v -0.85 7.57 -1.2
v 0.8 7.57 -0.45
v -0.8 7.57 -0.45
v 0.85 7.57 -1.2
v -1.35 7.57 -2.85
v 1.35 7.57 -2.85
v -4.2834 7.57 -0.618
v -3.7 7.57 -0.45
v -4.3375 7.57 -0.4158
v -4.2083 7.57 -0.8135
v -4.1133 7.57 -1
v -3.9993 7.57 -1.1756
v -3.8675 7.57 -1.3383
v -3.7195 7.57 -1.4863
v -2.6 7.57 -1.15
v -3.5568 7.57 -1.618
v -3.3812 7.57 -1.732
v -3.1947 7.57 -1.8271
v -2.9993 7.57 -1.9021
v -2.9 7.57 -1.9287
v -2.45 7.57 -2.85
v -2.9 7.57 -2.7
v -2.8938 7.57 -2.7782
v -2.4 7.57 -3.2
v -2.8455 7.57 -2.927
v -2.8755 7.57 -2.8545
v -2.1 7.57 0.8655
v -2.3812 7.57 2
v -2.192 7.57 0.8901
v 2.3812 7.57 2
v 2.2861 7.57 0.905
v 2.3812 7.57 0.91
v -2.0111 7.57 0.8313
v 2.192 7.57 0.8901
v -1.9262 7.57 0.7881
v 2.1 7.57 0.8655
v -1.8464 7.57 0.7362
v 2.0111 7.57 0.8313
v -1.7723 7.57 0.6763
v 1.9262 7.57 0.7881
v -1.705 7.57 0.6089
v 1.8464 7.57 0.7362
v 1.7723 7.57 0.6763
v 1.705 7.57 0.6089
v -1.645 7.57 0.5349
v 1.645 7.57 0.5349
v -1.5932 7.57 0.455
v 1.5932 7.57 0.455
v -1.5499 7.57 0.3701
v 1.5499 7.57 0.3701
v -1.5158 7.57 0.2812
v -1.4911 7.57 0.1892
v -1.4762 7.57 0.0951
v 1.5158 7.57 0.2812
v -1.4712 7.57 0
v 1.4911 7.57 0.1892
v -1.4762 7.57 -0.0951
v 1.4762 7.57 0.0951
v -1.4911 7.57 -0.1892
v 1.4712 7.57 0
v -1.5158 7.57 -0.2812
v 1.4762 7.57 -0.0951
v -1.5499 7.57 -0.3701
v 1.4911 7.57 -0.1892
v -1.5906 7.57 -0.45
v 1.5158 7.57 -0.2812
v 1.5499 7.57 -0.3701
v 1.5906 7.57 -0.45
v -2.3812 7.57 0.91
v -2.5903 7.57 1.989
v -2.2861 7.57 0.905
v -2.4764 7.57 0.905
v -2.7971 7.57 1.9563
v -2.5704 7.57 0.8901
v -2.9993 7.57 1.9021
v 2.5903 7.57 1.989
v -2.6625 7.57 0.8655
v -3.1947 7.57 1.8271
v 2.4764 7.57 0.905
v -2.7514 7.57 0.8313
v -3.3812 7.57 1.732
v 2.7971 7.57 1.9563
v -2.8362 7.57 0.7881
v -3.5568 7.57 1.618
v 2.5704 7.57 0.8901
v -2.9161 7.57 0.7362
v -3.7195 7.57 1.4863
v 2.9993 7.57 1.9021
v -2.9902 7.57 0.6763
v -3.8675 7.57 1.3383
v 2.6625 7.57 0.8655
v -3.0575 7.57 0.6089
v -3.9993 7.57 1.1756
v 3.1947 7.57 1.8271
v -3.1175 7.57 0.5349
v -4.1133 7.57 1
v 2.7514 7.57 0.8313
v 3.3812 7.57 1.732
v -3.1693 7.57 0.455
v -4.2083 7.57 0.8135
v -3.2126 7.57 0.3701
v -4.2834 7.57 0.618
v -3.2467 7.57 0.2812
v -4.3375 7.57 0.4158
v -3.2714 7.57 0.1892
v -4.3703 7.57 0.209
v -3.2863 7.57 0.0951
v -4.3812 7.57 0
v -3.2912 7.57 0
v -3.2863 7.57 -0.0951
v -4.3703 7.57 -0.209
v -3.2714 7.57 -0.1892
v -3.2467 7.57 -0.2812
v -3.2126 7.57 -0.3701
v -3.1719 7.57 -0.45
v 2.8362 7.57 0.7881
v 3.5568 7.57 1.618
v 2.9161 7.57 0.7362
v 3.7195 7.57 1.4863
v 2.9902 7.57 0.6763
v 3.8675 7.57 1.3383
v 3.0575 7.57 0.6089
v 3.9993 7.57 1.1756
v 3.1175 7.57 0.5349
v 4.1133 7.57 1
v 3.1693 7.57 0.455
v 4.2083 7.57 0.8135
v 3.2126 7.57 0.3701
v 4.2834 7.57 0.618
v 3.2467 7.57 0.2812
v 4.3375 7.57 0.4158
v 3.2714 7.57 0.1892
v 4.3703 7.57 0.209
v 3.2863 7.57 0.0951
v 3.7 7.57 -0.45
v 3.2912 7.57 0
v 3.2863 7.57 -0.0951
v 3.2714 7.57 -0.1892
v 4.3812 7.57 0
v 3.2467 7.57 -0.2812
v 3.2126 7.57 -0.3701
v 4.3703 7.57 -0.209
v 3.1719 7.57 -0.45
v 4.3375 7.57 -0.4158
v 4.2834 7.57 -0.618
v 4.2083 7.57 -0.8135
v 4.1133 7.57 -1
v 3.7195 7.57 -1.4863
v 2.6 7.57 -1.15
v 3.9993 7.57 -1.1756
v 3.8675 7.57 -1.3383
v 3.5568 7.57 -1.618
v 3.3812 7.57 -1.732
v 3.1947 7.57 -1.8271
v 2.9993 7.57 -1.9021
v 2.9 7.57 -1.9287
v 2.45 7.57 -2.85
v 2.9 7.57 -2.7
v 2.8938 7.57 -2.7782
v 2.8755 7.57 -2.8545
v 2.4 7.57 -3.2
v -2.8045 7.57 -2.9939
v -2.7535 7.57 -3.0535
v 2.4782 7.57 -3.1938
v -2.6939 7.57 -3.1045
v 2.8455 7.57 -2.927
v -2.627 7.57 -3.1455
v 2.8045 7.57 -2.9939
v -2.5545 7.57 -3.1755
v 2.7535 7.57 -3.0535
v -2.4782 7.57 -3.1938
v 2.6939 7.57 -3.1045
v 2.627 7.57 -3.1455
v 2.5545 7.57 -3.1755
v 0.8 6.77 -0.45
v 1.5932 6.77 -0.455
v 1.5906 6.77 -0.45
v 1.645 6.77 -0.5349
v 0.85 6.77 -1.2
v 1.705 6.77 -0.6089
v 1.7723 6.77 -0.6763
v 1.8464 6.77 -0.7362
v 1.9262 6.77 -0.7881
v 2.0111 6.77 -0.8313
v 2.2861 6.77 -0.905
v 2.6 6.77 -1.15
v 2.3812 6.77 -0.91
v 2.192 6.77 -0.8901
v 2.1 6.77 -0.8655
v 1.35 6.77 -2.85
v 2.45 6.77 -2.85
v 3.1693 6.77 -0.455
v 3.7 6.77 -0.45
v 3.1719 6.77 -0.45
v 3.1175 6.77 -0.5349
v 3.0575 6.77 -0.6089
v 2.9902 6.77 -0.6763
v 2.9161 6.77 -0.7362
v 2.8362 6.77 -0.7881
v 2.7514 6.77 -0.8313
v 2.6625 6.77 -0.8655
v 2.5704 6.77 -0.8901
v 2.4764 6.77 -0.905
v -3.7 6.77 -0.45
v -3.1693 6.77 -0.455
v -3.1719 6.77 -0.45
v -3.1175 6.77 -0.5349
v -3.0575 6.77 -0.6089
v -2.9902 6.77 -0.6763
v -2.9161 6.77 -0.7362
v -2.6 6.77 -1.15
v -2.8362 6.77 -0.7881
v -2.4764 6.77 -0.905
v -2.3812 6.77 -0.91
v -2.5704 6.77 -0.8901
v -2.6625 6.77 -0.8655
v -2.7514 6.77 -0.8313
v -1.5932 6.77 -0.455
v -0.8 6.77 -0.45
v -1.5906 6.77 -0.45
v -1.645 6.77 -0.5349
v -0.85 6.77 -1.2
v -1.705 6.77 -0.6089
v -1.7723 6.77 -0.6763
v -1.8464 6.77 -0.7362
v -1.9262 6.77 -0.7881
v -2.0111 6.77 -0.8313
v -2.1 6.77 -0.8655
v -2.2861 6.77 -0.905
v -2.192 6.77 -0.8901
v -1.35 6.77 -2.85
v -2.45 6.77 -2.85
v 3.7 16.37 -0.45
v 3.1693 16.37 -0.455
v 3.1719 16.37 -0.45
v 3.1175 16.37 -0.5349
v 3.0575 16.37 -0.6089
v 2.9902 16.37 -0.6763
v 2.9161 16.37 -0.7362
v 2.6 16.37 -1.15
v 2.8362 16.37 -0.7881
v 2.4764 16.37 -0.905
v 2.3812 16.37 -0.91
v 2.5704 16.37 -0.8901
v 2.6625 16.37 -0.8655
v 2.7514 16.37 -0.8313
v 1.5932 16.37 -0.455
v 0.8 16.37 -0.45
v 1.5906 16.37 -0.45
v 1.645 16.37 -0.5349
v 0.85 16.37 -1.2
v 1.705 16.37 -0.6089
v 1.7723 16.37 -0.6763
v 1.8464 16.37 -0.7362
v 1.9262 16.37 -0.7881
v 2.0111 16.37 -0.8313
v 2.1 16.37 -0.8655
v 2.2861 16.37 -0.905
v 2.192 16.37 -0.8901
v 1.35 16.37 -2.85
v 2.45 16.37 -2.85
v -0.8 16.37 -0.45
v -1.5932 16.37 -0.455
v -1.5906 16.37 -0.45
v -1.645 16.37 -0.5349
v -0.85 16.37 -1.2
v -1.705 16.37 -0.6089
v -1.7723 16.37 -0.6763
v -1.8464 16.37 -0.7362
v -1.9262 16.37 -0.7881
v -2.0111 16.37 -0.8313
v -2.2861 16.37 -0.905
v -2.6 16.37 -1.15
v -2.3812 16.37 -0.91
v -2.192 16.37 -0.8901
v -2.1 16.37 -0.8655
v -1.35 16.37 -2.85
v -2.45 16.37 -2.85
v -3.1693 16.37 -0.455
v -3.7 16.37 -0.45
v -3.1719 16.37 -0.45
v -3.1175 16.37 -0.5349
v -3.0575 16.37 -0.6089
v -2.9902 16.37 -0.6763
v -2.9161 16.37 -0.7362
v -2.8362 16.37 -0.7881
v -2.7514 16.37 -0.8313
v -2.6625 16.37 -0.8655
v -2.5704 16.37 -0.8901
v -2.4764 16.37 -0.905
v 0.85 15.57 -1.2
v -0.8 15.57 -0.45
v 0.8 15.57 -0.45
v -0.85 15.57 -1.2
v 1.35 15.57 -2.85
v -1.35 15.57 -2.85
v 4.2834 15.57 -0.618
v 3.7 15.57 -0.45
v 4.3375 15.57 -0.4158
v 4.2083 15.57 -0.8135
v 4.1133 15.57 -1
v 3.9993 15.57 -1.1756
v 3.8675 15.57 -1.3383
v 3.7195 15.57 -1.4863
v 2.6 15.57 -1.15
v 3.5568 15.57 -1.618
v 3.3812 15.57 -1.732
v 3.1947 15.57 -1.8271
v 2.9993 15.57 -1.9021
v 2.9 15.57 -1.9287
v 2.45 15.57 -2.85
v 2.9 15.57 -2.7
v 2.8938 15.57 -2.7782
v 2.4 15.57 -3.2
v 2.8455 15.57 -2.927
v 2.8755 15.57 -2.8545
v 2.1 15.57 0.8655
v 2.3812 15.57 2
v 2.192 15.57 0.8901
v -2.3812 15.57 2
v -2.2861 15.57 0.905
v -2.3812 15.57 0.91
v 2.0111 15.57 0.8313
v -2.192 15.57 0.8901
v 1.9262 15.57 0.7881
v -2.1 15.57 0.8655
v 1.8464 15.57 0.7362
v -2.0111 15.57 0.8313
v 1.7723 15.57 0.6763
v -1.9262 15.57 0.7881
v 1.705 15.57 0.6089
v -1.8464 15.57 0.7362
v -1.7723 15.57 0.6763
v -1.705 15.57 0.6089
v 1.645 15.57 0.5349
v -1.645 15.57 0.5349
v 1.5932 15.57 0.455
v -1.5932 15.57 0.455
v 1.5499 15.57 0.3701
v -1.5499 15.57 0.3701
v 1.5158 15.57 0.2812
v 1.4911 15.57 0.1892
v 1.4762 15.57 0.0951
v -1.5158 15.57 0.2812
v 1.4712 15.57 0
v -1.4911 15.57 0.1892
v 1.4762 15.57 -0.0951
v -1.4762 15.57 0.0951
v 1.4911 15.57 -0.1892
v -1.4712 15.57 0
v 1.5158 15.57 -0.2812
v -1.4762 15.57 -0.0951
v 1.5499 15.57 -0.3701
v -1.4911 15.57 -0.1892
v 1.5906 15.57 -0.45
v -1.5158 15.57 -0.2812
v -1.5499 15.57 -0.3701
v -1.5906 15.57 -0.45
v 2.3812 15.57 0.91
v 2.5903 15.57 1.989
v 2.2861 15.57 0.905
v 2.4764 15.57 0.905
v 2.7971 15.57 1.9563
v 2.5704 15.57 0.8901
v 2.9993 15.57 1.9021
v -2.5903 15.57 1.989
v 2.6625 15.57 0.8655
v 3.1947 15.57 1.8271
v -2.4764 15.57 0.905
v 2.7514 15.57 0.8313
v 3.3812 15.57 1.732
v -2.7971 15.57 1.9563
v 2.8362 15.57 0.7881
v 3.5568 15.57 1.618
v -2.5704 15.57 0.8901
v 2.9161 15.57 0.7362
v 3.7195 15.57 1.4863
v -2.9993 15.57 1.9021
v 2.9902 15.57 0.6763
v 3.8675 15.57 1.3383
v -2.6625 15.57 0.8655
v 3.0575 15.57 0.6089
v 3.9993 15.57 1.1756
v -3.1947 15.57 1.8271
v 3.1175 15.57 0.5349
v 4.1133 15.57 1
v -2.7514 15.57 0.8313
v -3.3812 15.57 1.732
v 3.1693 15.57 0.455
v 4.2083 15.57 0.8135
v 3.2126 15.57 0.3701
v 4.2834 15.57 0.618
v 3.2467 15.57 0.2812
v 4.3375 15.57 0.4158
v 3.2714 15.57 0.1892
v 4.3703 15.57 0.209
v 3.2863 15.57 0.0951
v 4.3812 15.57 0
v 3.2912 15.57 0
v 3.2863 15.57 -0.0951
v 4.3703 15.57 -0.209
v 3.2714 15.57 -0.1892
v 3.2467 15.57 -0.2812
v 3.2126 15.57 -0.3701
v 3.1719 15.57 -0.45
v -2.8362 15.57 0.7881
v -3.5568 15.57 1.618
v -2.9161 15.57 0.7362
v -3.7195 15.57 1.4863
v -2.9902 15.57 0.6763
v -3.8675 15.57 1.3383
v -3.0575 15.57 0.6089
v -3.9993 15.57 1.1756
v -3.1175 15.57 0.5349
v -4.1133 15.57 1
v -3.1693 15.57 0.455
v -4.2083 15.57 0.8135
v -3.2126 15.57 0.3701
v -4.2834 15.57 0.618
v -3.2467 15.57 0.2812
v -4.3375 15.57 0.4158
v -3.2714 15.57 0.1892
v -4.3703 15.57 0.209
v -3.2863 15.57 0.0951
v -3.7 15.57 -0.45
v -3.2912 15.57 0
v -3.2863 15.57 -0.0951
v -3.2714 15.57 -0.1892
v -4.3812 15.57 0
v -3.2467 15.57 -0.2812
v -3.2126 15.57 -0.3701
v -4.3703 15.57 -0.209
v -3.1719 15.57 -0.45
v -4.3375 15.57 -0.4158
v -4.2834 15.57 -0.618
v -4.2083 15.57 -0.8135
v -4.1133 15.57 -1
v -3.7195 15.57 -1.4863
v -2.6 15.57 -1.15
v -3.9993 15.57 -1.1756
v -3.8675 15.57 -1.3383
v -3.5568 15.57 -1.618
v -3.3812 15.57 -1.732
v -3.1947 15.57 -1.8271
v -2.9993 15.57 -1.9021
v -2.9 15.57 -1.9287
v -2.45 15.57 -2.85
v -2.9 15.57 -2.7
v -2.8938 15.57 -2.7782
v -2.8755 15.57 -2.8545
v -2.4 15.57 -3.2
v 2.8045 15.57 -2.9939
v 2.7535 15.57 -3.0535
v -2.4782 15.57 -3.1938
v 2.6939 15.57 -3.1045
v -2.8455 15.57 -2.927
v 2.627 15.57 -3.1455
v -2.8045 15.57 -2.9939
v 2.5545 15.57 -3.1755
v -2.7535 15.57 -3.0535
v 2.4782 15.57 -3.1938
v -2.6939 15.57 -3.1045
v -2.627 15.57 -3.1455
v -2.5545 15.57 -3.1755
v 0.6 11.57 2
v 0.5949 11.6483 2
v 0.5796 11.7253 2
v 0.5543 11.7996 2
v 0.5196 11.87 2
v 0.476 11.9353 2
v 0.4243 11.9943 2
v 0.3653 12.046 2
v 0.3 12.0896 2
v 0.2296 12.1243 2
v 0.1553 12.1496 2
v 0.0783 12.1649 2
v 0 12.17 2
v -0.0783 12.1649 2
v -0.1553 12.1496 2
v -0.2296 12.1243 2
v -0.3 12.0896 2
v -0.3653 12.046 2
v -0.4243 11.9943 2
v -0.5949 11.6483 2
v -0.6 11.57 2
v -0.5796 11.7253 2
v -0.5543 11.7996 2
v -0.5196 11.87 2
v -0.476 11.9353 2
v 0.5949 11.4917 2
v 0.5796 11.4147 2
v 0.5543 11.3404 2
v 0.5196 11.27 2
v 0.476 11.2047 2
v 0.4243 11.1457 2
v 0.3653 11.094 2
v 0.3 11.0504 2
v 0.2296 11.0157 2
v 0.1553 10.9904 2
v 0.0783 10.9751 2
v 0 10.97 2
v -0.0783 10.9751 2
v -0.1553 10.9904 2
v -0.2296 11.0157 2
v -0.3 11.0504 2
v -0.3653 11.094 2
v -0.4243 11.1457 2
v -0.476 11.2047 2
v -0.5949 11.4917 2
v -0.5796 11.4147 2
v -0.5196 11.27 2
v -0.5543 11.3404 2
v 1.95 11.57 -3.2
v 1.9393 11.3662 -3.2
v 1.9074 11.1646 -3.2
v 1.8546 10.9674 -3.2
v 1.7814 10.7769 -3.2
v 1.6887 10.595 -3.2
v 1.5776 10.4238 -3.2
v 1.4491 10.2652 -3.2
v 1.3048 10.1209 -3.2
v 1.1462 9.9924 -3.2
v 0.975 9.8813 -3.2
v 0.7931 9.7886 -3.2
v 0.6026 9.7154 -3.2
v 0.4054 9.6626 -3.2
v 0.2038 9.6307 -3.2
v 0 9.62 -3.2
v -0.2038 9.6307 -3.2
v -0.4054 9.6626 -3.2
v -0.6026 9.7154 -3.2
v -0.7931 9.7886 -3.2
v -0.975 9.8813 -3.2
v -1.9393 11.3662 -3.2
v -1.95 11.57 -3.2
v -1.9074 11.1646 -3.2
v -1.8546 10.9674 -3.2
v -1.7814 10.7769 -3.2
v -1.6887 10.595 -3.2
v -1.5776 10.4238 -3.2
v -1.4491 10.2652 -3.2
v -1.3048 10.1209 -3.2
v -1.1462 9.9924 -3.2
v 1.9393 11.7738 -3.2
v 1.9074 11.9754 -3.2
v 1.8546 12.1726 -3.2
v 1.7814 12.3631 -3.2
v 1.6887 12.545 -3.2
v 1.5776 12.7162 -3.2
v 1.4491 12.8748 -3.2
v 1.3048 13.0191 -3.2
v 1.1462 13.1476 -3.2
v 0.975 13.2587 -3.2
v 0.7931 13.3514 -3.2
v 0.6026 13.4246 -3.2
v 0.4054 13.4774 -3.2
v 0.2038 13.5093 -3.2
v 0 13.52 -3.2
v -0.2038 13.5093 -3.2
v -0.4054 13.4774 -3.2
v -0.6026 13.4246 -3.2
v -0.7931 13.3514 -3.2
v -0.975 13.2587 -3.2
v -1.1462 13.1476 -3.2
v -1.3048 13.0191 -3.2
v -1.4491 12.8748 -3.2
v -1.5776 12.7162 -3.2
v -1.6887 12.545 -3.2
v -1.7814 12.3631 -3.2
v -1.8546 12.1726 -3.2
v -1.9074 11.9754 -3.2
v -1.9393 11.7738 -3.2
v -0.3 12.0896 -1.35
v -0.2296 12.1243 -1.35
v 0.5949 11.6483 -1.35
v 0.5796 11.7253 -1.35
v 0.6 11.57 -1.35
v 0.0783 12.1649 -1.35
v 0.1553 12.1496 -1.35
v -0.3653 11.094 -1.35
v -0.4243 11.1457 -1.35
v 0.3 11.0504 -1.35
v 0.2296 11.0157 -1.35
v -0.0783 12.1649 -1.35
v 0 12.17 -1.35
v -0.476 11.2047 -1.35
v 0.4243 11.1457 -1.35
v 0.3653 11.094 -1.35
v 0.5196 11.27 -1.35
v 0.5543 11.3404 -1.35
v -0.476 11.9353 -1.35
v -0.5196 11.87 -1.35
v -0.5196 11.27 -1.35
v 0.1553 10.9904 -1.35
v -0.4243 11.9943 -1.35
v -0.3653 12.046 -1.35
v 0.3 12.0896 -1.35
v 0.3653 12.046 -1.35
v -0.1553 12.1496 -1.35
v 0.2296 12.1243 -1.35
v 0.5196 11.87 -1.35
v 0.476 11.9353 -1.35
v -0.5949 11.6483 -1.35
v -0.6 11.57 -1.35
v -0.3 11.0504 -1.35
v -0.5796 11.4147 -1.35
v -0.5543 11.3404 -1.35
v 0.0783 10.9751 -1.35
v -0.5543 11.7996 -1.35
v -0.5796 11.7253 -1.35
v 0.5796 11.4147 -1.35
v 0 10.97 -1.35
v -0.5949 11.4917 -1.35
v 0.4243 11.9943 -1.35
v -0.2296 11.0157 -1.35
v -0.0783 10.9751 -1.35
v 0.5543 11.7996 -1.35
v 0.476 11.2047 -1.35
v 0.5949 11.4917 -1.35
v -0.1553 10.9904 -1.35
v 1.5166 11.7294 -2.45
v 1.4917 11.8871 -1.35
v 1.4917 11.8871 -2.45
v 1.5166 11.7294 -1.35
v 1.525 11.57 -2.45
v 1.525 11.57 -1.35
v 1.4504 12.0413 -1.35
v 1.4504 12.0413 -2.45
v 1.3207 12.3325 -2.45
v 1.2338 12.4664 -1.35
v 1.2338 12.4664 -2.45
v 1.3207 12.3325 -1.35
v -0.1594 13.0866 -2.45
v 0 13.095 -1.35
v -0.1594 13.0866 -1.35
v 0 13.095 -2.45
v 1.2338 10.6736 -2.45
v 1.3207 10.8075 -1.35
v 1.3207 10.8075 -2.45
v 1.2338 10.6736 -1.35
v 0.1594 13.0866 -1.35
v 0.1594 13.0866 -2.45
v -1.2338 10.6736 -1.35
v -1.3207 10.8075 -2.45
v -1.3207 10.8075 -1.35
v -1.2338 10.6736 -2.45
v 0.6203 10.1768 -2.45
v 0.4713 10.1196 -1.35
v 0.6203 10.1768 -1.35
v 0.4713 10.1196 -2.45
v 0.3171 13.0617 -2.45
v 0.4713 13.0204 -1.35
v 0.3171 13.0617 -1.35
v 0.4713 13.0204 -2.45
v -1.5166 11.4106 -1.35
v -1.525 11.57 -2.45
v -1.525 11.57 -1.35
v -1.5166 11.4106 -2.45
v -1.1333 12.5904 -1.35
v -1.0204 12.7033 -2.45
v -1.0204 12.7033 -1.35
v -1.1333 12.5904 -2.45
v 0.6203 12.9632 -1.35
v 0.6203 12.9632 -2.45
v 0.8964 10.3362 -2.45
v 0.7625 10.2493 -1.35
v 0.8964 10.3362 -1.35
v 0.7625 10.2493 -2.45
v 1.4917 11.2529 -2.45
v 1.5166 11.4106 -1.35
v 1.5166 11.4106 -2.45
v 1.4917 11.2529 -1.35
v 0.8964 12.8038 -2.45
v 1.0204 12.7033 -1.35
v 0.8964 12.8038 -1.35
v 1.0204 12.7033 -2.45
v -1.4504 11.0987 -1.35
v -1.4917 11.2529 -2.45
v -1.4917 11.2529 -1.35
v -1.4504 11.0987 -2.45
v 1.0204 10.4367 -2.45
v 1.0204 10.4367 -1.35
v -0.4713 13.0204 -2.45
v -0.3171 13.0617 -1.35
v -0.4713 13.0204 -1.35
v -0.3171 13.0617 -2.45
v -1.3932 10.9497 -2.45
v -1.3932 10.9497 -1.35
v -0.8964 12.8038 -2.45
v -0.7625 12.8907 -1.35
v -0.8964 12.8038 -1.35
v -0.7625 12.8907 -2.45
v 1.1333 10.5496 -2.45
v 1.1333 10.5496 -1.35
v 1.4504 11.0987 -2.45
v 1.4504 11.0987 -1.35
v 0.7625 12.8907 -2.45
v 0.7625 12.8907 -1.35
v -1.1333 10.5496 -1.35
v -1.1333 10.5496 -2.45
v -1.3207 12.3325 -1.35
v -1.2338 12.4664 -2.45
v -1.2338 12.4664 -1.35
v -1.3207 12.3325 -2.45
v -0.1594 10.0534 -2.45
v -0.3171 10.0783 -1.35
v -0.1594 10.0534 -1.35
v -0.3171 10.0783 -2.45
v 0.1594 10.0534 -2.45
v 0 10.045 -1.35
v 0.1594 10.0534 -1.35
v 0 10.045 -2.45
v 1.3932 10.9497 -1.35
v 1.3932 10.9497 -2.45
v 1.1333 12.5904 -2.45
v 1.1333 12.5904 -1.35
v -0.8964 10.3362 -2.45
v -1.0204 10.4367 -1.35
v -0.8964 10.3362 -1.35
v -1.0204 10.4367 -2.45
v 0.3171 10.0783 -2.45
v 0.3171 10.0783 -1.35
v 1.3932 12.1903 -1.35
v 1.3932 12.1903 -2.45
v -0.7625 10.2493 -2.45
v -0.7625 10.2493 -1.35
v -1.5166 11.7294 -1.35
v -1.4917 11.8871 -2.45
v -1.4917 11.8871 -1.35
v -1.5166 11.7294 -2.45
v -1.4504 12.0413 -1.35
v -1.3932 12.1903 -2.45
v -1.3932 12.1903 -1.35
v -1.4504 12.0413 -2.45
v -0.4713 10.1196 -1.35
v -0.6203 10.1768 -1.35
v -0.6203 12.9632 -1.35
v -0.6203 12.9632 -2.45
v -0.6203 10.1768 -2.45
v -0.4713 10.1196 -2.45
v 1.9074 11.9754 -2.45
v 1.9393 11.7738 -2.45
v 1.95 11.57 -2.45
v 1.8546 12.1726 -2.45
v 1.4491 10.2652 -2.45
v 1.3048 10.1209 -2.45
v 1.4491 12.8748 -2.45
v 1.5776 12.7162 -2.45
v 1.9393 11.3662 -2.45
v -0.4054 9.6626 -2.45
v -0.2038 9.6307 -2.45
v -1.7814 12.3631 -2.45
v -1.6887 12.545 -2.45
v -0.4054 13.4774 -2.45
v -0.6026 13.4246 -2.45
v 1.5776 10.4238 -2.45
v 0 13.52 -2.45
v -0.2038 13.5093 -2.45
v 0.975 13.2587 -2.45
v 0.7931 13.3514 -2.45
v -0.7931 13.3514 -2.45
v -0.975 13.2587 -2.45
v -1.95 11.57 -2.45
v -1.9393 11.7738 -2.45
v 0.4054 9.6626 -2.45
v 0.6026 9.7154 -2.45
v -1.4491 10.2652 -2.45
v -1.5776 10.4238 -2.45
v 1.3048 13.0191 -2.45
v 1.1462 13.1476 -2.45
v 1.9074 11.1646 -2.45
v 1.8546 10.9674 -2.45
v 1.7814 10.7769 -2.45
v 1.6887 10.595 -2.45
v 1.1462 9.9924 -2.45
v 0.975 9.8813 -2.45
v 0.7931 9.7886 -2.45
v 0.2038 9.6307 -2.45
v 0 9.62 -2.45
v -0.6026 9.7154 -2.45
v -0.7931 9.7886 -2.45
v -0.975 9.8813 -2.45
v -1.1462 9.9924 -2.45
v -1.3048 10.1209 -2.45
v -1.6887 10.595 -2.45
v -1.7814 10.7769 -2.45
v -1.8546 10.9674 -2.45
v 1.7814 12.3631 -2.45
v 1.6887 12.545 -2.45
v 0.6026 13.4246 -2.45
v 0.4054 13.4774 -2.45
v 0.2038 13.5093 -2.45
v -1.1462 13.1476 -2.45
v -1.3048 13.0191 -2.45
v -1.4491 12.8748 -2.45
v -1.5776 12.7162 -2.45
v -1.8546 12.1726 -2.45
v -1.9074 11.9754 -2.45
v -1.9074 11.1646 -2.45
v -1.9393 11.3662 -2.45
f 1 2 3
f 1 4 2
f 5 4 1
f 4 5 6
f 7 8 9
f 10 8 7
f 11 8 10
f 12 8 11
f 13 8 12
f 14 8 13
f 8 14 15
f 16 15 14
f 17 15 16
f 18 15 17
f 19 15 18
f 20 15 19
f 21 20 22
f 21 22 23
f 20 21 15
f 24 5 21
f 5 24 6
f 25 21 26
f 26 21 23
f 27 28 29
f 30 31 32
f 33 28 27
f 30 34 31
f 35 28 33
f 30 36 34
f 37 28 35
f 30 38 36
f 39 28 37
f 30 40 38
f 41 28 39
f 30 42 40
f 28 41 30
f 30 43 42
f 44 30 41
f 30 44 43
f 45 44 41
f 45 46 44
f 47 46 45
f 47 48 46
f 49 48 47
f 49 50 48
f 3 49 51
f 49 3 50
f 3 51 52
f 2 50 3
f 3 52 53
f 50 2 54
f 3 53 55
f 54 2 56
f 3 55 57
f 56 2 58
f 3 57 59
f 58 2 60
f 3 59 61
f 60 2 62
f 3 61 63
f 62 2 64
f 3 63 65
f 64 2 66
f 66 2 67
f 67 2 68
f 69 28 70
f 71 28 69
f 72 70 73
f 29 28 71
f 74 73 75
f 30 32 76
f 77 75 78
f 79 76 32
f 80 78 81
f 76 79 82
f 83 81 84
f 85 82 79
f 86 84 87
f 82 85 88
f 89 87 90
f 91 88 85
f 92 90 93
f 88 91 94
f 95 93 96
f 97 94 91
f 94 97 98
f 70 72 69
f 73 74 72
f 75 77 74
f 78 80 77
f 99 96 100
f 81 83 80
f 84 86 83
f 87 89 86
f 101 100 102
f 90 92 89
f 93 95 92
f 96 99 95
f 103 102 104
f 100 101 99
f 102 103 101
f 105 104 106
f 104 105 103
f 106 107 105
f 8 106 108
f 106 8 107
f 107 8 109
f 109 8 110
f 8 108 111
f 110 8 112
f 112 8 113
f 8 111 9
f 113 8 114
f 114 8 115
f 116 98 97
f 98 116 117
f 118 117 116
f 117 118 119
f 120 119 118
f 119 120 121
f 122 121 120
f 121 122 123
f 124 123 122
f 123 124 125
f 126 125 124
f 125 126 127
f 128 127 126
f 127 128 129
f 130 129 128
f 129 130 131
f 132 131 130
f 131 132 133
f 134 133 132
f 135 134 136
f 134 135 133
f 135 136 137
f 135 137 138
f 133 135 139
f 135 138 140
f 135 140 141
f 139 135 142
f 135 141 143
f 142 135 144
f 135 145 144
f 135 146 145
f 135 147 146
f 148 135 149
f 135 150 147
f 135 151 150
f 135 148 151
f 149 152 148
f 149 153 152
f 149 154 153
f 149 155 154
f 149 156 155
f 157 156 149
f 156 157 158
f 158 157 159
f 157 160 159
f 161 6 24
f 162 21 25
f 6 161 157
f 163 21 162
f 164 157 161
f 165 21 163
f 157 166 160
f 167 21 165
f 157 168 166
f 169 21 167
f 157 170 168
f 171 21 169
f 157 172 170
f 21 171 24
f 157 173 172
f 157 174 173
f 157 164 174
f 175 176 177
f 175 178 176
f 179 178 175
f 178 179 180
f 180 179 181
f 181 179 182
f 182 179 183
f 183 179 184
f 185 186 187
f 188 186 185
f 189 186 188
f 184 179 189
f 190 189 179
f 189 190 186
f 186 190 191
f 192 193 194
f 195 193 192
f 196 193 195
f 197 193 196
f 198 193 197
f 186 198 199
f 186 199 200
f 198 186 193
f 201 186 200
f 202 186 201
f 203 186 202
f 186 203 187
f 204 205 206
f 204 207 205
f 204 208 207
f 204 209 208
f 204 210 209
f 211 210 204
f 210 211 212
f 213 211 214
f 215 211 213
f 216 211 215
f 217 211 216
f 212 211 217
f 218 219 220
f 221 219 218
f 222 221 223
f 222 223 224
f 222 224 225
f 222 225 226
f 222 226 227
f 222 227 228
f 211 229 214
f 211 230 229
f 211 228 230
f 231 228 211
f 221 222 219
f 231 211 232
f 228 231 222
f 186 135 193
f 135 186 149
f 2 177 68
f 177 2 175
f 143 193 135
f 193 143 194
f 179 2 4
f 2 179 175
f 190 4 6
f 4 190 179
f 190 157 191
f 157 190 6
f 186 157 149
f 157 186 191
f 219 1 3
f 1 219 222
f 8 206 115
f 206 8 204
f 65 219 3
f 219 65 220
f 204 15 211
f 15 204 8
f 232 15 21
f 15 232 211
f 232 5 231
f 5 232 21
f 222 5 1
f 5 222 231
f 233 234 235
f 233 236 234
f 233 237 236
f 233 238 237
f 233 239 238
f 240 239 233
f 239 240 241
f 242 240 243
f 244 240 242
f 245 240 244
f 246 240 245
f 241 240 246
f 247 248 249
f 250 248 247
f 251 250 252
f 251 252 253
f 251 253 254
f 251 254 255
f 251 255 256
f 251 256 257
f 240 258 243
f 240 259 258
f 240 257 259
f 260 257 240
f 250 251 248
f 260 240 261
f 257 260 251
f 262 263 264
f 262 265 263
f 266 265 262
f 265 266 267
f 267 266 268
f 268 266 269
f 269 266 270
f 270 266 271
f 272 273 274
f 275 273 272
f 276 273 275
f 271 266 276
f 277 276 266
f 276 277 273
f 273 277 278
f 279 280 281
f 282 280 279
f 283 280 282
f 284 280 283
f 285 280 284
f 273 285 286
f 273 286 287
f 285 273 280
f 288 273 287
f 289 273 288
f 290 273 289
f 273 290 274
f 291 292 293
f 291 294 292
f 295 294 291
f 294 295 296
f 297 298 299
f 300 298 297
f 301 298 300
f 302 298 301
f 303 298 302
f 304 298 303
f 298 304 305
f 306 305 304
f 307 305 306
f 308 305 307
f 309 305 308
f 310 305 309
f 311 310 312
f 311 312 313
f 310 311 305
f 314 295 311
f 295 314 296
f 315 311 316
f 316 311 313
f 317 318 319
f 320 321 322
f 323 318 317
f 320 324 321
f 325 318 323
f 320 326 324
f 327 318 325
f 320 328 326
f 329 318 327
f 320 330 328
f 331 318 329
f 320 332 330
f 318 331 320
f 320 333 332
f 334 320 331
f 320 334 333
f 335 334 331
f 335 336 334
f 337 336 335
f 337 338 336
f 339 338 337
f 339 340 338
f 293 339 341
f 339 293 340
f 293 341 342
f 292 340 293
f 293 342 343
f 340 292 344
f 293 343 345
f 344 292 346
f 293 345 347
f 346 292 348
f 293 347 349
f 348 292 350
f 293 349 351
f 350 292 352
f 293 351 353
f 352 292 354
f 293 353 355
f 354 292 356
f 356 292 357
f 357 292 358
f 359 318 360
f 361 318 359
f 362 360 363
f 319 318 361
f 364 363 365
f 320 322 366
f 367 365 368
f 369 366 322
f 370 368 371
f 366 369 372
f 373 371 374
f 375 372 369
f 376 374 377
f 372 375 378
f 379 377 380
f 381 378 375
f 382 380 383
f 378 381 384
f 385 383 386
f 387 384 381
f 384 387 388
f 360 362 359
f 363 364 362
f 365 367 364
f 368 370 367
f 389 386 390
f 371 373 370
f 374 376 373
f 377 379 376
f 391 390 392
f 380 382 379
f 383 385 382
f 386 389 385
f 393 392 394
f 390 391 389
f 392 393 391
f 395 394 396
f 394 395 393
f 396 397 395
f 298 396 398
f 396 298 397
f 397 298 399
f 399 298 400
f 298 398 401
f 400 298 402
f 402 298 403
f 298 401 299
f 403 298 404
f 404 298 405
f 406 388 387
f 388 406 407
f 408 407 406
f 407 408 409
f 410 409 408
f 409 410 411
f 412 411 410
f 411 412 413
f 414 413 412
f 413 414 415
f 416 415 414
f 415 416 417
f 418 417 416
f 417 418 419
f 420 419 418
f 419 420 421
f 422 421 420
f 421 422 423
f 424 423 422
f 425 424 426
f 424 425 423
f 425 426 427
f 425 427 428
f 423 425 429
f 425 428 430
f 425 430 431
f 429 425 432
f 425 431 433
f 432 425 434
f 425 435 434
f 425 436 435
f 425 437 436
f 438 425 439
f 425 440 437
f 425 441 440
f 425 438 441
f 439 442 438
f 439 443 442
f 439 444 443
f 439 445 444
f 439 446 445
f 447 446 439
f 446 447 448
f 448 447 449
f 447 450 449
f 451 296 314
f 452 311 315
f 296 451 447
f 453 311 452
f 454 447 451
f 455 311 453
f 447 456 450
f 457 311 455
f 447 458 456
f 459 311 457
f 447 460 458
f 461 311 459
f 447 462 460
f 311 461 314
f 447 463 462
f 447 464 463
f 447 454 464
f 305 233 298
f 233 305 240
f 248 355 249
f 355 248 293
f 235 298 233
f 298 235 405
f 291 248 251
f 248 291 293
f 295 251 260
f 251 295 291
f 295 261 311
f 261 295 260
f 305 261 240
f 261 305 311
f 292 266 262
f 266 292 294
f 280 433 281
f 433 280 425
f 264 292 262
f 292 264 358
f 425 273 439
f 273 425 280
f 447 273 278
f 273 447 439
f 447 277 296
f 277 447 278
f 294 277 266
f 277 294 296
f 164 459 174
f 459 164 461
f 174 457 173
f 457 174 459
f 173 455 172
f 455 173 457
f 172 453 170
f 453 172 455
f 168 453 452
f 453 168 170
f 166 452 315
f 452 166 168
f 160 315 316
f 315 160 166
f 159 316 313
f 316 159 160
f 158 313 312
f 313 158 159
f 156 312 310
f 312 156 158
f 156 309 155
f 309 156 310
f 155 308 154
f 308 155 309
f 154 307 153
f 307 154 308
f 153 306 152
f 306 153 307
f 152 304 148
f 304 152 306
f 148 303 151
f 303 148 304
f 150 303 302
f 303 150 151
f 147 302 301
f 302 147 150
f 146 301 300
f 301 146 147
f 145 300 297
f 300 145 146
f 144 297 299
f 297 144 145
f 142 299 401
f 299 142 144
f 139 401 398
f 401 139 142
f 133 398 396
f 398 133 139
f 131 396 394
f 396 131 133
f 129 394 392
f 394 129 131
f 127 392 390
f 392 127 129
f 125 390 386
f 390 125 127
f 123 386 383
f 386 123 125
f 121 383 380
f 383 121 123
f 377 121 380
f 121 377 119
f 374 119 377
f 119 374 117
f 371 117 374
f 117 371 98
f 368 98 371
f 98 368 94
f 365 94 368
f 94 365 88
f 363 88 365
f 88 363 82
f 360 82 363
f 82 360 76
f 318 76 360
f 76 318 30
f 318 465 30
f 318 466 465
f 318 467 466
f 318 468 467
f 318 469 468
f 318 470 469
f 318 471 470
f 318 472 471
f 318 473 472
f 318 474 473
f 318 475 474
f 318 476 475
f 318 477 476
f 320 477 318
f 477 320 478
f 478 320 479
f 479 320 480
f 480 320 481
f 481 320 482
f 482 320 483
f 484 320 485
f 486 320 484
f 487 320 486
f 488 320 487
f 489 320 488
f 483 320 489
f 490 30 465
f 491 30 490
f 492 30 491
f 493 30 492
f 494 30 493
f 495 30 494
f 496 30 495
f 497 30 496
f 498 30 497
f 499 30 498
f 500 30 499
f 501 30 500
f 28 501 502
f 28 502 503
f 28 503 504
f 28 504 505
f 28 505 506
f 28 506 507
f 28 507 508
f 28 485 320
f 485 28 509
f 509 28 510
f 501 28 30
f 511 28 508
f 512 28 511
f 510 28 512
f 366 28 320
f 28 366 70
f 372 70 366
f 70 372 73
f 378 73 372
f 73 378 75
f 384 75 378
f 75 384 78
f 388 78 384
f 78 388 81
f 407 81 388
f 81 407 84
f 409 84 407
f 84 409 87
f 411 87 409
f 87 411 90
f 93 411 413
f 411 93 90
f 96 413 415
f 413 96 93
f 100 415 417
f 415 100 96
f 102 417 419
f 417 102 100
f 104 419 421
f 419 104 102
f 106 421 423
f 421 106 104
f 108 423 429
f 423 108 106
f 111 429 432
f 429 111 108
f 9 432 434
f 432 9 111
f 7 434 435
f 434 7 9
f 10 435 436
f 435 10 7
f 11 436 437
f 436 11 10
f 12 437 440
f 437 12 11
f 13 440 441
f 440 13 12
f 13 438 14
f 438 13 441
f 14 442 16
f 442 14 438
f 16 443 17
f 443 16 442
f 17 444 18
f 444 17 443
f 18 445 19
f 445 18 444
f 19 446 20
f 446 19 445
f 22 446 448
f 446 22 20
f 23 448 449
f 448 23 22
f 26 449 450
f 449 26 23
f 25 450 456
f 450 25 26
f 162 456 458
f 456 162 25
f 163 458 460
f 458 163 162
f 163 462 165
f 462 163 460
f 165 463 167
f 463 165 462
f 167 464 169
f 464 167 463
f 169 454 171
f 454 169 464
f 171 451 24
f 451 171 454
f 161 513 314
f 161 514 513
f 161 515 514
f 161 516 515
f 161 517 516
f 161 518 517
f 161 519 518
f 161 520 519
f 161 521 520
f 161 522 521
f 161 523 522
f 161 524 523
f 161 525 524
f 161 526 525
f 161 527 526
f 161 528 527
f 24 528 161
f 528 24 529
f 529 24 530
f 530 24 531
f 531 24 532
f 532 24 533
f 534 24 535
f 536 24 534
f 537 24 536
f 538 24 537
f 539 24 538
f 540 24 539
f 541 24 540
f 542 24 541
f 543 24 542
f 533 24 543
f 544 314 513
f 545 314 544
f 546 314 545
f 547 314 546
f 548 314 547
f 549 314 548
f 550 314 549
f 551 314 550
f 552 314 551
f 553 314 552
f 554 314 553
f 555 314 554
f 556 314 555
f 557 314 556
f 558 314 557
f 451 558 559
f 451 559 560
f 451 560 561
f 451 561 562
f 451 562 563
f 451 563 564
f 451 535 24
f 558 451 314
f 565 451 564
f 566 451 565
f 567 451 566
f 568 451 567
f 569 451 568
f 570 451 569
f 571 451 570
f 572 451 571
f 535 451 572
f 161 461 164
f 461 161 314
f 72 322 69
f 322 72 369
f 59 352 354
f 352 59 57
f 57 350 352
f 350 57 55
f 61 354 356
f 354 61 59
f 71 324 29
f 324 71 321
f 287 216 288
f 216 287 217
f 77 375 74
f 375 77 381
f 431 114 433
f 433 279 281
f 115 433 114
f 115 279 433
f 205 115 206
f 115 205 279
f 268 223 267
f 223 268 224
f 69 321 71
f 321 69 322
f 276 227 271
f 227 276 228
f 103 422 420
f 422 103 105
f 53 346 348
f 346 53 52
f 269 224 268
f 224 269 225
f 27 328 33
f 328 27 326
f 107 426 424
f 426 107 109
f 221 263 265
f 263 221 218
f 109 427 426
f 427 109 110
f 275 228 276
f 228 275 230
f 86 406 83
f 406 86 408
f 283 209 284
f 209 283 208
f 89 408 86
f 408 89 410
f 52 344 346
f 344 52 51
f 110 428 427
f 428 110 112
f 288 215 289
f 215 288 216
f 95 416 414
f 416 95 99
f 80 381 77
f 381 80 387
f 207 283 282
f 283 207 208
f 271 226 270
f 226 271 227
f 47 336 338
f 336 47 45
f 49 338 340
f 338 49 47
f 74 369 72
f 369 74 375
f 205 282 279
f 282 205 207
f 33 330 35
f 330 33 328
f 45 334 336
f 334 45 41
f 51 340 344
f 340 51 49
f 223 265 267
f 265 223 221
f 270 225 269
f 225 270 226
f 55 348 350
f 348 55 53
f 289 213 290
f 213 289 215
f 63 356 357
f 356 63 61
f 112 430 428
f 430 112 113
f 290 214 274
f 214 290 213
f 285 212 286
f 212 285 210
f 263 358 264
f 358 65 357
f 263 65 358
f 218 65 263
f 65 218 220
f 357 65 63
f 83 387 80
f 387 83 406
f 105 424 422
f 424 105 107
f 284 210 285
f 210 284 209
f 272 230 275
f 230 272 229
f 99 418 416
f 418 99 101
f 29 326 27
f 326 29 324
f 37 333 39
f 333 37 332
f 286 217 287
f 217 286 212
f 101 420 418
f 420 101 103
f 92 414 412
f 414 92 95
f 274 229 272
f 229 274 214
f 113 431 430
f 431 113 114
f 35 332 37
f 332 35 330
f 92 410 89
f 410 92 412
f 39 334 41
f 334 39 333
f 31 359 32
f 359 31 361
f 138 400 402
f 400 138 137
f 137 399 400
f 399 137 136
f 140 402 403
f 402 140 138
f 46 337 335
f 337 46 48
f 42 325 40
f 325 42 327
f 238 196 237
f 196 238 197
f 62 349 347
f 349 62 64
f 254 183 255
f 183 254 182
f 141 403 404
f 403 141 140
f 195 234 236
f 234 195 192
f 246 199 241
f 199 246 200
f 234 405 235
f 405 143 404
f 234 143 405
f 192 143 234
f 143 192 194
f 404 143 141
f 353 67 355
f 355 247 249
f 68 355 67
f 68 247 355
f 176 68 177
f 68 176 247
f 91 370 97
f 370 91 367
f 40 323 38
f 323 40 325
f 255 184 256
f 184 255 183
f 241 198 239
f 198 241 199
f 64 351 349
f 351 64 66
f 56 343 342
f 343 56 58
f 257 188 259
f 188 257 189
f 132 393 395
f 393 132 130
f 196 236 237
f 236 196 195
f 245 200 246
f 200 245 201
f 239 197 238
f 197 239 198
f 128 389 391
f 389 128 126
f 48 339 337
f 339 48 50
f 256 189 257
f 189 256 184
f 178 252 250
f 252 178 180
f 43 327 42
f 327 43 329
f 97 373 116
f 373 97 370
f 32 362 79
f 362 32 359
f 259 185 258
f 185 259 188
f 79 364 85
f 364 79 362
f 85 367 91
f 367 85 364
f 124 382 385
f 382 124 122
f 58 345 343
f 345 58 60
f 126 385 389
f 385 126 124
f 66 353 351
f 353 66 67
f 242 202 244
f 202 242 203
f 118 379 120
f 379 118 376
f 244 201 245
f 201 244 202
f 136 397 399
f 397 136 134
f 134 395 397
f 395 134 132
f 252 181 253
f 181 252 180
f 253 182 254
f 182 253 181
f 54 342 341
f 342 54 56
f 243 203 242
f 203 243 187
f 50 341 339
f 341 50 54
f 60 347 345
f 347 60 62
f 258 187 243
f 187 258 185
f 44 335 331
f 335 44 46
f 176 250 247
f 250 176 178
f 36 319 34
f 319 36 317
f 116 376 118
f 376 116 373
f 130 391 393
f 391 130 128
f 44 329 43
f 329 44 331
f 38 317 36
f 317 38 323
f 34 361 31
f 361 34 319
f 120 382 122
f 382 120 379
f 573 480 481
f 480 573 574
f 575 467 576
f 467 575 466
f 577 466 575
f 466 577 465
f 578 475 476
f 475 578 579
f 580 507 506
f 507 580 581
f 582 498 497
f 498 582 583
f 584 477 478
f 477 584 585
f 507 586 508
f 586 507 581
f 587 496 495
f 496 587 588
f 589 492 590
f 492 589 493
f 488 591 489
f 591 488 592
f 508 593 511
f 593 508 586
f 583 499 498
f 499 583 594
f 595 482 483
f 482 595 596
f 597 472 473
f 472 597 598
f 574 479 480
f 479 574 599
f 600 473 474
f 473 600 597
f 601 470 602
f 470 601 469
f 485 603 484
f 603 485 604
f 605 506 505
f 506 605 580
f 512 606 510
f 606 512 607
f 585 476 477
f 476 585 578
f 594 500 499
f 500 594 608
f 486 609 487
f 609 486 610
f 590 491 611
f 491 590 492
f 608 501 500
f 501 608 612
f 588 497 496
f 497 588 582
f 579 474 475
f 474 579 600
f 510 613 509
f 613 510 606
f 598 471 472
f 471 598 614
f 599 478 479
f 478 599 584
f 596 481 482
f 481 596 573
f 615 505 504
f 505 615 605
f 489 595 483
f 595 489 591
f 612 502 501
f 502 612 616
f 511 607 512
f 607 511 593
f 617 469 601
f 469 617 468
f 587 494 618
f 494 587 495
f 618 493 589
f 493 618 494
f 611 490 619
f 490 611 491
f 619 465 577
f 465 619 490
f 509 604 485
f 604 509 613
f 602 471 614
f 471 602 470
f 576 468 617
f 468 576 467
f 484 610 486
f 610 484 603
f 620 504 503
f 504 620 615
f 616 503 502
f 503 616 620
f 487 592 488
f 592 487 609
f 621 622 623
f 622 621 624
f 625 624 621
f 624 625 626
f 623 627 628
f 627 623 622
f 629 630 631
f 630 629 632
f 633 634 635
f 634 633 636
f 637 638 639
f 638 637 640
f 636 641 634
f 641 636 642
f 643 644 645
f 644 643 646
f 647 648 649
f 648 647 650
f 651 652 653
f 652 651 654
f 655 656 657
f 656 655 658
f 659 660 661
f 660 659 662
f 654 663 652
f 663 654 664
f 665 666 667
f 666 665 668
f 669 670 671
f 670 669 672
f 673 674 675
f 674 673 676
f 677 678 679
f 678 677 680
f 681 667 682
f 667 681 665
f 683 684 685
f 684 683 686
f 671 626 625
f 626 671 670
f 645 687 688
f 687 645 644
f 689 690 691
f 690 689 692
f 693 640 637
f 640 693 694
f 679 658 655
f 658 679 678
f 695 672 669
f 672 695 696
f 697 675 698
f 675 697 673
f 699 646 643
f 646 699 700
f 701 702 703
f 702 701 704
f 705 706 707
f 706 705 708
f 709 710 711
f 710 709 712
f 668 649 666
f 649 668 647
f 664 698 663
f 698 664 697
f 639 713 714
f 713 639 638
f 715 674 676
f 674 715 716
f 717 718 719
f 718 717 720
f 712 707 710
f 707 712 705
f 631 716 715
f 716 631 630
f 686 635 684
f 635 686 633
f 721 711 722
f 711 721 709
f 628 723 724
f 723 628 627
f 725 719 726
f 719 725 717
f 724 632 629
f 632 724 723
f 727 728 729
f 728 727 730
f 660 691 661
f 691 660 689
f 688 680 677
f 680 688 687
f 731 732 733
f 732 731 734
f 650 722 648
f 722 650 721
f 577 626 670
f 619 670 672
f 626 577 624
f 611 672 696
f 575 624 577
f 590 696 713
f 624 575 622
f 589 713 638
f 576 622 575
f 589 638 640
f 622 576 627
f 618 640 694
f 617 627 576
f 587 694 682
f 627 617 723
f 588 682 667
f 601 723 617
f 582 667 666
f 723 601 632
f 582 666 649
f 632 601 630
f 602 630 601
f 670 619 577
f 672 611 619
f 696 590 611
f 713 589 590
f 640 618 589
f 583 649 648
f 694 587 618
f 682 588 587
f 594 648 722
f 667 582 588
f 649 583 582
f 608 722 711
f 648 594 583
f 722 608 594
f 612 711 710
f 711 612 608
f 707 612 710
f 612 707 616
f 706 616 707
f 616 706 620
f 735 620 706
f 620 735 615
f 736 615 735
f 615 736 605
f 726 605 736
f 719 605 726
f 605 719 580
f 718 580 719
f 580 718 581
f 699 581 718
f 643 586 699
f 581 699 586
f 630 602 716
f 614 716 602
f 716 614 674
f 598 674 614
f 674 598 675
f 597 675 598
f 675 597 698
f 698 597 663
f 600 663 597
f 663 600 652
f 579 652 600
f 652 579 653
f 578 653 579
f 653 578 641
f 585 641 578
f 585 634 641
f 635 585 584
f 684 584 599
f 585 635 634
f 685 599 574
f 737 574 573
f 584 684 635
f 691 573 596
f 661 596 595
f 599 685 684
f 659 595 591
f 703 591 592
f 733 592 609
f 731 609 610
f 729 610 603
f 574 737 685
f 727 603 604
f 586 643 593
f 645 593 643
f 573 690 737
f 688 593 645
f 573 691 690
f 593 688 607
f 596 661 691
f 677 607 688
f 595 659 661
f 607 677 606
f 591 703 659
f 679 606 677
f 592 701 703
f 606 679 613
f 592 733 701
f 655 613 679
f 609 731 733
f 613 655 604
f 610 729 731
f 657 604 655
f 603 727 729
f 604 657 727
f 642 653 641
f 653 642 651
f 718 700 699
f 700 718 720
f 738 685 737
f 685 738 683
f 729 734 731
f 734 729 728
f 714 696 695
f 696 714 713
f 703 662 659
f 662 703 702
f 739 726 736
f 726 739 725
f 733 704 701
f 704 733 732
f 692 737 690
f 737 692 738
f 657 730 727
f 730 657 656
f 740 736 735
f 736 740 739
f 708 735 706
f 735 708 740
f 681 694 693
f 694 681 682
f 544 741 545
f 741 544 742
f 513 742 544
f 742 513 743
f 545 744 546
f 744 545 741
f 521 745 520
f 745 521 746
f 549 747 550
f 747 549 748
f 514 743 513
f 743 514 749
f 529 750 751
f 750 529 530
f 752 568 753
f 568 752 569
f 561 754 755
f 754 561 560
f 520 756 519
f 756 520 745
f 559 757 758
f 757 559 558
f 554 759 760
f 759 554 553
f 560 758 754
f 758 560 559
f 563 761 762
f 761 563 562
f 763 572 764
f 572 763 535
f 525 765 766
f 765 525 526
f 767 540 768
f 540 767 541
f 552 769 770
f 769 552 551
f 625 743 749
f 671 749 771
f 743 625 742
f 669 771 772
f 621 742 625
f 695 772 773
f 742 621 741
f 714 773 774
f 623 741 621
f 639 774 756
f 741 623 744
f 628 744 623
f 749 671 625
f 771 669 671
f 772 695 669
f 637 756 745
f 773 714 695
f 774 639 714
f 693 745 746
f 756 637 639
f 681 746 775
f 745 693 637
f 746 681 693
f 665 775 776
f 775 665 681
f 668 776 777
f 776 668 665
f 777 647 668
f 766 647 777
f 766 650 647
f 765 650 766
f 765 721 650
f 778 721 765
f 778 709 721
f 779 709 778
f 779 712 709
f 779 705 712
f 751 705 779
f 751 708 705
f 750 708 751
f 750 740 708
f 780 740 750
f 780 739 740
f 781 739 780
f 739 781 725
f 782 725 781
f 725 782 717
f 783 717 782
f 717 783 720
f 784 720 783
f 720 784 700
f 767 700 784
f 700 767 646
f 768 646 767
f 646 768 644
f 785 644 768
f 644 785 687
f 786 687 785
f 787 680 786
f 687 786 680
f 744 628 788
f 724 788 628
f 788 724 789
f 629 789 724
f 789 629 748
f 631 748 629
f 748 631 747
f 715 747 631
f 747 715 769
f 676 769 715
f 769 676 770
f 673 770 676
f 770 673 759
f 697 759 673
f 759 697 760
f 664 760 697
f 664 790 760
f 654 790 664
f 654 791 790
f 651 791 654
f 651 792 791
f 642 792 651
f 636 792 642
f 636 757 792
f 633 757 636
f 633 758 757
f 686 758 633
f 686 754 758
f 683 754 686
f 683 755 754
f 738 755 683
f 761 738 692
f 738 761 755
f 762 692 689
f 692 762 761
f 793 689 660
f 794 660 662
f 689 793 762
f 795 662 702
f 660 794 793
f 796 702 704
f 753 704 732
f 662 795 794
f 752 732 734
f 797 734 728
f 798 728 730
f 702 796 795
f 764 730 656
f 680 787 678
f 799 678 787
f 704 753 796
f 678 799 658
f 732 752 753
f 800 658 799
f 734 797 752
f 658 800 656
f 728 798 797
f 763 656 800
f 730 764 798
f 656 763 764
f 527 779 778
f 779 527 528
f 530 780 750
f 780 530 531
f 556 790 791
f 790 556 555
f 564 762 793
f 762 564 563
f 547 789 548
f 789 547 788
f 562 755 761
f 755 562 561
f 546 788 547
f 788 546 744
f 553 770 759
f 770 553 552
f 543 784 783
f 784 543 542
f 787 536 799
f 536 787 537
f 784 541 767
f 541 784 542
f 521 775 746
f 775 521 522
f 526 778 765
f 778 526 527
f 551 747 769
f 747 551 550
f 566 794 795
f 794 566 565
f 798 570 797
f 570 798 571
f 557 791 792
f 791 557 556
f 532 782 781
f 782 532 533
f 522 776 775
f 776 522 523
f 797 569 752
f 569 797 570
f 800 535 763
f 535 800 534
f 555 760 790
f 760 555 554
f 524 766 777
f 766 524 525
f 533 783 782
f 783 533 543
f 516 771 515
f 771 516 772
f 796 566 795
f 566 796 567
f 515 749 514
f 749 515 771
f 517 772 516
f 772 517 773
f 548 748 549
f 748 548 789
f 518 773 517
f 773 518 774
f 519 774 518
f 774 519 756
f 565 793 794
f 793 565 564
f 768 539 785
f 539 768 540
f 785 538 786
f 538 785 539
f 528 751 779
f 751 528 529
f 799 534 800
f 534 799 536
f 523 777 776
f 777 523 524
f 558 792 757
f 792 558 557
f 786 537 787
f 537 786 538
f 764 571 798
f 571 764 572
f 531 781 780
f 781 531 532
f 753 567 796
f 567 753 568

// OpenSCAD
// file: ch1_03c_params.scad
// CH1 03C 单排滚子链 — 尺寸真值源：docs/parts/CH1-03C-roller-chain.md
// 单位：毫米。这是外购碳钢链条的 CAD 包络，不是 FDM 打印件。

//#region 导入/依赖
// 无外部库；几何由本文件常数驱动。
//#endregion

//#region 常量/配置
P = 4.7625;          // 节距：系列表 / SKU 210L（图面写 4.762）
h2 = 4.3;            // 内链板高度 h2（卖家图 + ISO h2 max）
d1 = 2.48;           // 03C 图面「滚子」= ISO 套筒外径 d1 max（本规格无独立滚子）
d2 = 1.62;           // 销轴直径 d2 max
Lc = 6.9;            // ISO / 图面销轴总长 Lc max；装配外形用贴板铆头，不把细杆伸出这么长
L = 6.10;            // 铆头内侧销长 L max（ISO，图面未标数）
T = 0.6;             // 链板厚度 T max
b1 = 2.38;           // 内节内宽 b1 min（ISO；图面有符号无数字）
waist = 2.6;         // 链板腰宽：按卖家 8 字外形，不是标准表列
rivet_d = 2.15;      // 铆头直径：按侧视铆头 > d2
rivet_h = 0.40;      // 贴在外板外侧的铆头高度；避免 (Lc-L)/2 拉出细 stem
fillet = 0.42;       // 腰部凹圆角
roller_end_gap = 0.02;  // 仅 CSG 间隙，不留可见轴向窜动
journal_od = 2.05;      // 穿内板轴颈；可见鼓面仍用 d1
links_sku = 210;

inner_width = b1;
bushing_od = journal_od;
plate_stack = inner_width + 4 * T;
outer_face = plate_stack / 2;
pin_length = plate_stack + 2 * rivet_h;
visible_bush_len = inner_width - 2 * roller_end_gap;
clearance = 0.04;
eps = 0.05;
//#endregion

//#region 模型/类型
// 无独立类型；零件由 inner/outer plate、roller、pin、bushing 组成。
//#endregion

//#region 私有成员
// 几何常数全部公开给根模型 include。
//#endregion

//#region 公开 API
// include 后直接使用 P / h2 / d1 / d2 / pin_length / T。
//#endregion

//#region 业务逻辑
// SKU 210L × 4.7625 mm = 1000.125 mm。
// b1 / L 图面未标数，取 ISO 03C min/max；链板腰宽按卖家 8 字外形。
// 可见套筒长度必须是 b1，不是 b1+2T；后者会从斜向看成过长的连接棍。
// 销轴细杆只穿过板叠；铆头贴外板。Lc=6.9 是规格上限，不是要把 stem 拉到 6.9。
//#endregion

//#region 方法/工具
// 无。
//#endregion
// file: parts/ch1_03c_connecting_link_params.scad
// CH1 03C 连接节五金 — 由 docs/parts/CH1-03C-roller-chain.md 参数化
// 单位：毫米。03C 链条本体是外购碳钢件；这里是连接节穿销/弹片的参考模型。

//#region 导入/依赖
include <../ch1_03c_params.scad>
//#endregion

//#region 常量/配置
$fa = 6;
$fs = 0.08;

// 文档明确给出的连接节主尺寸。
CONNECTING_PIN_PAIR_SPACING = P;       // 两根穿销的中心距 = 链条节距
CONNECTING_PIN_SHAFT_D = d2;           // 03C 销轴直径
CONNECTING_PIN_LENGTH = Lc;            // 03C 图面销轴总长
CONNECTING_PIN_HEAD_D = rivet_d;       // 固定端圆头的参考直径
CONNECTING_PIN_HEAD_H = rivet_h;

// 卖家文档没有给 CL 弹片专用槽宽/展开图；以下是装配原型的显式假设。
// 夹片从销轴侧面滑入槽内，内孔小于销身但大于槽底，形成卡持。
CONNECTING_PIN_GROOVE_D = 1.20;
CONNECTING_PIN_GROOVE_W = 0.34;
CONNECTING_PIN_GROOVE_FROM_TIP = 0.48;
CONNECTING_PIN_GROOVE_CENTER = CONNECTING_PIN_LENGTH / 2 - CONNECTING_PIN_GROOVE_FROM_TIP;

RETAINING_CLIP_T = 0.30;
RETAINING_CLIP_EAR_OD = 2.20;
RETAINING_CLIP_HOLE_D = CONNECTING_PIN_GROOVE_D + 0.12;
RETAINING_CLIP_ENTRY_W = 0.40;
RETAINING_CLIP_BRIDGE_T = 0.48;
RETAINING_CLIP_BRIDGE_Z = 0.72;
CONNECTING_LINK_EPS = 0.05;
//#endregion

//#region 模型/类型
// 连接节局部坐标：两销中心位于 x=±P/2，销轴沿 +Y；固定头在 -Y 端。
// 弹片位于 +Y 端槽内，两个 C 形耳孔的开口朝外，便于侧向滑入。
//#endregion

//#region 公开 API
// include 后可调用 ch1_03c_connecting_pin_pair()、ch1_03c_retaining_clip()。
//#endregion

//#region 私有成员
module connecting_pin_groove_cut(x) {
    translate([
        x,
        CONNECTING_PIN_GROOVE_CENTER - CONNECTING_PIN_GROOVE_W / 2,
        0
    ])
        rotate([-90, 0, 0])
            difference() {
                cylinder(
                    d = CONNECTING_PIN_SHAFT_D + 0.60,
                    h = CONNECTING_PIN_GROOVE_W
                );
                translate([0, 0, -CONNECTING_LINK_EPS])
                    cylinder(
                        d = CONNECTING_PIN_GROOVE_D,
                        h = CONNECTING_PIN_GROOVE_W + 2 * CONNECTING_LINK_EPS
                    );
            }
}

module connecting_pin_one(x) {
    difference() {
        union() {
            translate([x, -CONNECTING_PIN_LENGTH / 2, 0])
                rotate([-90, 0, 0])
                    cylinder(d = CONNECTING_PIN_SHAFT_D, h = CONNECTING_PIN_LENGTH);
            translate([x, -CONNECTING_PIN_LENGTH / 2, 0])
                rotate([-90, 0, 0])
                    cylinder(d = CONNECTING_PIN_HEAD_D, h = CONNECTING_PIN_HEAD_H);
        }
        connecting_pin_groove_cut(x);
    }
}

module retaining_clip_profile_2d() {
    difference() {
        union() {
            for (x = [-CONNECTING_PIN_PAIR_SPACING / 2, CONNECTING_PIN_PAIR_SPACING / 2])
                translate([x, 0])
                    circle(d = RETAINING_CLIP_EAR_OD);
            translate([0, RETAINING_CLIP_BRIDGE_Z])
                square([
                    CONNECTING_PIN_PAIR_SPACING + RETAINING_CLIP_EAR_OD,
                    RETAINING_CLIP_BRIDGE_T
                ], center = true);
        }
        for (side = [-1, 1]) {
            translate([side * CONNECTING_PIN_PAIR_SPACING / 2, 0])
                circle(d = RETAINING_CLIP_HOLE_D);
            // 侧向入口：切到外缘，保留上方桥接和内侧耳根。
            translate([
                side * (
                    CONNECTING_PIN_PAIR_SPACING / 2
                    + RETAINING_CLIP_EAR_OD / 2
                    - 0.05
                ),
                0
            ])
                square([
                    RETAINING_CLIP_EAR_OD,
                    RETAINING_CLIP_ENTRY_W
                ], center = true);
        }
    }
}
//#endregion

//#region 业务逻辑
module ch1_03c_connecting_pin_pair() {
    for (x = [-CONNECTING_PIN_PAIR_SPACING / 2, CONNECTING_PIN_PAIR_SPACING / 2])
        connecting_pin_one(x);
}

module ch1_03c_retaining_clip() {
    // 与双销保持同一装配坐标；单独打印时应将夹片绕 X 轴旋转 90° 铺平。
    translate([0, CONNECTING_PIN_GROOVE_CENTER, 0])
        rotate([90, 0, 0])
            linear_extrude(
                height = RETAINING_CLIP_T,
                center = true,
                convexity = 6
            )
                retaining_clip_profile_2d();
}

module ch1_03c_connecting_link_reference() {
    color("#b08d57") ch1_03c_connecting_pin_pair();
    color("#9aa7b6") ch1_03c_retaining_clip();
}
//#endregion

//#region 方法/工具
// 此文件是库；独立导出入口见 cad/openscad/ch1_03c_connecting_pin.scad
// 和 cad/openscad/ch1_03c_retaining_clip.scad。
//#endregion
// main file
// CH1 03C 传动离合轴承平台 — 独立模型库/打印入口

//#region 导入/依赖
include <parts/ch1_03c_extended_link_params.scad>
//#endregion

//#region 常量/配置
PART = is_undef(PART) ? "platform" : PART;
//#endregion

//#region 公开 API
if (PART == "platform")
    ch1_03c_clutch_platform();
else if (PART == "assembly")
    ch1_03c_extended_link_reference();
//#endregion

//#region 业务逻辑
// 平台占两夹片内侧 10 mm 净空间，主体沿 Y 厚 8.0 mm，前后各有 0.8 mm
// 对称加强筋，外廓 9.6 mm（两侧各留 0.2 mm）；轴承中心下移到 z=-2.0，
// 从下方沿 +Z 压入 681（1×3×1 mm），再由独立承托环锁住。
//#endregion
